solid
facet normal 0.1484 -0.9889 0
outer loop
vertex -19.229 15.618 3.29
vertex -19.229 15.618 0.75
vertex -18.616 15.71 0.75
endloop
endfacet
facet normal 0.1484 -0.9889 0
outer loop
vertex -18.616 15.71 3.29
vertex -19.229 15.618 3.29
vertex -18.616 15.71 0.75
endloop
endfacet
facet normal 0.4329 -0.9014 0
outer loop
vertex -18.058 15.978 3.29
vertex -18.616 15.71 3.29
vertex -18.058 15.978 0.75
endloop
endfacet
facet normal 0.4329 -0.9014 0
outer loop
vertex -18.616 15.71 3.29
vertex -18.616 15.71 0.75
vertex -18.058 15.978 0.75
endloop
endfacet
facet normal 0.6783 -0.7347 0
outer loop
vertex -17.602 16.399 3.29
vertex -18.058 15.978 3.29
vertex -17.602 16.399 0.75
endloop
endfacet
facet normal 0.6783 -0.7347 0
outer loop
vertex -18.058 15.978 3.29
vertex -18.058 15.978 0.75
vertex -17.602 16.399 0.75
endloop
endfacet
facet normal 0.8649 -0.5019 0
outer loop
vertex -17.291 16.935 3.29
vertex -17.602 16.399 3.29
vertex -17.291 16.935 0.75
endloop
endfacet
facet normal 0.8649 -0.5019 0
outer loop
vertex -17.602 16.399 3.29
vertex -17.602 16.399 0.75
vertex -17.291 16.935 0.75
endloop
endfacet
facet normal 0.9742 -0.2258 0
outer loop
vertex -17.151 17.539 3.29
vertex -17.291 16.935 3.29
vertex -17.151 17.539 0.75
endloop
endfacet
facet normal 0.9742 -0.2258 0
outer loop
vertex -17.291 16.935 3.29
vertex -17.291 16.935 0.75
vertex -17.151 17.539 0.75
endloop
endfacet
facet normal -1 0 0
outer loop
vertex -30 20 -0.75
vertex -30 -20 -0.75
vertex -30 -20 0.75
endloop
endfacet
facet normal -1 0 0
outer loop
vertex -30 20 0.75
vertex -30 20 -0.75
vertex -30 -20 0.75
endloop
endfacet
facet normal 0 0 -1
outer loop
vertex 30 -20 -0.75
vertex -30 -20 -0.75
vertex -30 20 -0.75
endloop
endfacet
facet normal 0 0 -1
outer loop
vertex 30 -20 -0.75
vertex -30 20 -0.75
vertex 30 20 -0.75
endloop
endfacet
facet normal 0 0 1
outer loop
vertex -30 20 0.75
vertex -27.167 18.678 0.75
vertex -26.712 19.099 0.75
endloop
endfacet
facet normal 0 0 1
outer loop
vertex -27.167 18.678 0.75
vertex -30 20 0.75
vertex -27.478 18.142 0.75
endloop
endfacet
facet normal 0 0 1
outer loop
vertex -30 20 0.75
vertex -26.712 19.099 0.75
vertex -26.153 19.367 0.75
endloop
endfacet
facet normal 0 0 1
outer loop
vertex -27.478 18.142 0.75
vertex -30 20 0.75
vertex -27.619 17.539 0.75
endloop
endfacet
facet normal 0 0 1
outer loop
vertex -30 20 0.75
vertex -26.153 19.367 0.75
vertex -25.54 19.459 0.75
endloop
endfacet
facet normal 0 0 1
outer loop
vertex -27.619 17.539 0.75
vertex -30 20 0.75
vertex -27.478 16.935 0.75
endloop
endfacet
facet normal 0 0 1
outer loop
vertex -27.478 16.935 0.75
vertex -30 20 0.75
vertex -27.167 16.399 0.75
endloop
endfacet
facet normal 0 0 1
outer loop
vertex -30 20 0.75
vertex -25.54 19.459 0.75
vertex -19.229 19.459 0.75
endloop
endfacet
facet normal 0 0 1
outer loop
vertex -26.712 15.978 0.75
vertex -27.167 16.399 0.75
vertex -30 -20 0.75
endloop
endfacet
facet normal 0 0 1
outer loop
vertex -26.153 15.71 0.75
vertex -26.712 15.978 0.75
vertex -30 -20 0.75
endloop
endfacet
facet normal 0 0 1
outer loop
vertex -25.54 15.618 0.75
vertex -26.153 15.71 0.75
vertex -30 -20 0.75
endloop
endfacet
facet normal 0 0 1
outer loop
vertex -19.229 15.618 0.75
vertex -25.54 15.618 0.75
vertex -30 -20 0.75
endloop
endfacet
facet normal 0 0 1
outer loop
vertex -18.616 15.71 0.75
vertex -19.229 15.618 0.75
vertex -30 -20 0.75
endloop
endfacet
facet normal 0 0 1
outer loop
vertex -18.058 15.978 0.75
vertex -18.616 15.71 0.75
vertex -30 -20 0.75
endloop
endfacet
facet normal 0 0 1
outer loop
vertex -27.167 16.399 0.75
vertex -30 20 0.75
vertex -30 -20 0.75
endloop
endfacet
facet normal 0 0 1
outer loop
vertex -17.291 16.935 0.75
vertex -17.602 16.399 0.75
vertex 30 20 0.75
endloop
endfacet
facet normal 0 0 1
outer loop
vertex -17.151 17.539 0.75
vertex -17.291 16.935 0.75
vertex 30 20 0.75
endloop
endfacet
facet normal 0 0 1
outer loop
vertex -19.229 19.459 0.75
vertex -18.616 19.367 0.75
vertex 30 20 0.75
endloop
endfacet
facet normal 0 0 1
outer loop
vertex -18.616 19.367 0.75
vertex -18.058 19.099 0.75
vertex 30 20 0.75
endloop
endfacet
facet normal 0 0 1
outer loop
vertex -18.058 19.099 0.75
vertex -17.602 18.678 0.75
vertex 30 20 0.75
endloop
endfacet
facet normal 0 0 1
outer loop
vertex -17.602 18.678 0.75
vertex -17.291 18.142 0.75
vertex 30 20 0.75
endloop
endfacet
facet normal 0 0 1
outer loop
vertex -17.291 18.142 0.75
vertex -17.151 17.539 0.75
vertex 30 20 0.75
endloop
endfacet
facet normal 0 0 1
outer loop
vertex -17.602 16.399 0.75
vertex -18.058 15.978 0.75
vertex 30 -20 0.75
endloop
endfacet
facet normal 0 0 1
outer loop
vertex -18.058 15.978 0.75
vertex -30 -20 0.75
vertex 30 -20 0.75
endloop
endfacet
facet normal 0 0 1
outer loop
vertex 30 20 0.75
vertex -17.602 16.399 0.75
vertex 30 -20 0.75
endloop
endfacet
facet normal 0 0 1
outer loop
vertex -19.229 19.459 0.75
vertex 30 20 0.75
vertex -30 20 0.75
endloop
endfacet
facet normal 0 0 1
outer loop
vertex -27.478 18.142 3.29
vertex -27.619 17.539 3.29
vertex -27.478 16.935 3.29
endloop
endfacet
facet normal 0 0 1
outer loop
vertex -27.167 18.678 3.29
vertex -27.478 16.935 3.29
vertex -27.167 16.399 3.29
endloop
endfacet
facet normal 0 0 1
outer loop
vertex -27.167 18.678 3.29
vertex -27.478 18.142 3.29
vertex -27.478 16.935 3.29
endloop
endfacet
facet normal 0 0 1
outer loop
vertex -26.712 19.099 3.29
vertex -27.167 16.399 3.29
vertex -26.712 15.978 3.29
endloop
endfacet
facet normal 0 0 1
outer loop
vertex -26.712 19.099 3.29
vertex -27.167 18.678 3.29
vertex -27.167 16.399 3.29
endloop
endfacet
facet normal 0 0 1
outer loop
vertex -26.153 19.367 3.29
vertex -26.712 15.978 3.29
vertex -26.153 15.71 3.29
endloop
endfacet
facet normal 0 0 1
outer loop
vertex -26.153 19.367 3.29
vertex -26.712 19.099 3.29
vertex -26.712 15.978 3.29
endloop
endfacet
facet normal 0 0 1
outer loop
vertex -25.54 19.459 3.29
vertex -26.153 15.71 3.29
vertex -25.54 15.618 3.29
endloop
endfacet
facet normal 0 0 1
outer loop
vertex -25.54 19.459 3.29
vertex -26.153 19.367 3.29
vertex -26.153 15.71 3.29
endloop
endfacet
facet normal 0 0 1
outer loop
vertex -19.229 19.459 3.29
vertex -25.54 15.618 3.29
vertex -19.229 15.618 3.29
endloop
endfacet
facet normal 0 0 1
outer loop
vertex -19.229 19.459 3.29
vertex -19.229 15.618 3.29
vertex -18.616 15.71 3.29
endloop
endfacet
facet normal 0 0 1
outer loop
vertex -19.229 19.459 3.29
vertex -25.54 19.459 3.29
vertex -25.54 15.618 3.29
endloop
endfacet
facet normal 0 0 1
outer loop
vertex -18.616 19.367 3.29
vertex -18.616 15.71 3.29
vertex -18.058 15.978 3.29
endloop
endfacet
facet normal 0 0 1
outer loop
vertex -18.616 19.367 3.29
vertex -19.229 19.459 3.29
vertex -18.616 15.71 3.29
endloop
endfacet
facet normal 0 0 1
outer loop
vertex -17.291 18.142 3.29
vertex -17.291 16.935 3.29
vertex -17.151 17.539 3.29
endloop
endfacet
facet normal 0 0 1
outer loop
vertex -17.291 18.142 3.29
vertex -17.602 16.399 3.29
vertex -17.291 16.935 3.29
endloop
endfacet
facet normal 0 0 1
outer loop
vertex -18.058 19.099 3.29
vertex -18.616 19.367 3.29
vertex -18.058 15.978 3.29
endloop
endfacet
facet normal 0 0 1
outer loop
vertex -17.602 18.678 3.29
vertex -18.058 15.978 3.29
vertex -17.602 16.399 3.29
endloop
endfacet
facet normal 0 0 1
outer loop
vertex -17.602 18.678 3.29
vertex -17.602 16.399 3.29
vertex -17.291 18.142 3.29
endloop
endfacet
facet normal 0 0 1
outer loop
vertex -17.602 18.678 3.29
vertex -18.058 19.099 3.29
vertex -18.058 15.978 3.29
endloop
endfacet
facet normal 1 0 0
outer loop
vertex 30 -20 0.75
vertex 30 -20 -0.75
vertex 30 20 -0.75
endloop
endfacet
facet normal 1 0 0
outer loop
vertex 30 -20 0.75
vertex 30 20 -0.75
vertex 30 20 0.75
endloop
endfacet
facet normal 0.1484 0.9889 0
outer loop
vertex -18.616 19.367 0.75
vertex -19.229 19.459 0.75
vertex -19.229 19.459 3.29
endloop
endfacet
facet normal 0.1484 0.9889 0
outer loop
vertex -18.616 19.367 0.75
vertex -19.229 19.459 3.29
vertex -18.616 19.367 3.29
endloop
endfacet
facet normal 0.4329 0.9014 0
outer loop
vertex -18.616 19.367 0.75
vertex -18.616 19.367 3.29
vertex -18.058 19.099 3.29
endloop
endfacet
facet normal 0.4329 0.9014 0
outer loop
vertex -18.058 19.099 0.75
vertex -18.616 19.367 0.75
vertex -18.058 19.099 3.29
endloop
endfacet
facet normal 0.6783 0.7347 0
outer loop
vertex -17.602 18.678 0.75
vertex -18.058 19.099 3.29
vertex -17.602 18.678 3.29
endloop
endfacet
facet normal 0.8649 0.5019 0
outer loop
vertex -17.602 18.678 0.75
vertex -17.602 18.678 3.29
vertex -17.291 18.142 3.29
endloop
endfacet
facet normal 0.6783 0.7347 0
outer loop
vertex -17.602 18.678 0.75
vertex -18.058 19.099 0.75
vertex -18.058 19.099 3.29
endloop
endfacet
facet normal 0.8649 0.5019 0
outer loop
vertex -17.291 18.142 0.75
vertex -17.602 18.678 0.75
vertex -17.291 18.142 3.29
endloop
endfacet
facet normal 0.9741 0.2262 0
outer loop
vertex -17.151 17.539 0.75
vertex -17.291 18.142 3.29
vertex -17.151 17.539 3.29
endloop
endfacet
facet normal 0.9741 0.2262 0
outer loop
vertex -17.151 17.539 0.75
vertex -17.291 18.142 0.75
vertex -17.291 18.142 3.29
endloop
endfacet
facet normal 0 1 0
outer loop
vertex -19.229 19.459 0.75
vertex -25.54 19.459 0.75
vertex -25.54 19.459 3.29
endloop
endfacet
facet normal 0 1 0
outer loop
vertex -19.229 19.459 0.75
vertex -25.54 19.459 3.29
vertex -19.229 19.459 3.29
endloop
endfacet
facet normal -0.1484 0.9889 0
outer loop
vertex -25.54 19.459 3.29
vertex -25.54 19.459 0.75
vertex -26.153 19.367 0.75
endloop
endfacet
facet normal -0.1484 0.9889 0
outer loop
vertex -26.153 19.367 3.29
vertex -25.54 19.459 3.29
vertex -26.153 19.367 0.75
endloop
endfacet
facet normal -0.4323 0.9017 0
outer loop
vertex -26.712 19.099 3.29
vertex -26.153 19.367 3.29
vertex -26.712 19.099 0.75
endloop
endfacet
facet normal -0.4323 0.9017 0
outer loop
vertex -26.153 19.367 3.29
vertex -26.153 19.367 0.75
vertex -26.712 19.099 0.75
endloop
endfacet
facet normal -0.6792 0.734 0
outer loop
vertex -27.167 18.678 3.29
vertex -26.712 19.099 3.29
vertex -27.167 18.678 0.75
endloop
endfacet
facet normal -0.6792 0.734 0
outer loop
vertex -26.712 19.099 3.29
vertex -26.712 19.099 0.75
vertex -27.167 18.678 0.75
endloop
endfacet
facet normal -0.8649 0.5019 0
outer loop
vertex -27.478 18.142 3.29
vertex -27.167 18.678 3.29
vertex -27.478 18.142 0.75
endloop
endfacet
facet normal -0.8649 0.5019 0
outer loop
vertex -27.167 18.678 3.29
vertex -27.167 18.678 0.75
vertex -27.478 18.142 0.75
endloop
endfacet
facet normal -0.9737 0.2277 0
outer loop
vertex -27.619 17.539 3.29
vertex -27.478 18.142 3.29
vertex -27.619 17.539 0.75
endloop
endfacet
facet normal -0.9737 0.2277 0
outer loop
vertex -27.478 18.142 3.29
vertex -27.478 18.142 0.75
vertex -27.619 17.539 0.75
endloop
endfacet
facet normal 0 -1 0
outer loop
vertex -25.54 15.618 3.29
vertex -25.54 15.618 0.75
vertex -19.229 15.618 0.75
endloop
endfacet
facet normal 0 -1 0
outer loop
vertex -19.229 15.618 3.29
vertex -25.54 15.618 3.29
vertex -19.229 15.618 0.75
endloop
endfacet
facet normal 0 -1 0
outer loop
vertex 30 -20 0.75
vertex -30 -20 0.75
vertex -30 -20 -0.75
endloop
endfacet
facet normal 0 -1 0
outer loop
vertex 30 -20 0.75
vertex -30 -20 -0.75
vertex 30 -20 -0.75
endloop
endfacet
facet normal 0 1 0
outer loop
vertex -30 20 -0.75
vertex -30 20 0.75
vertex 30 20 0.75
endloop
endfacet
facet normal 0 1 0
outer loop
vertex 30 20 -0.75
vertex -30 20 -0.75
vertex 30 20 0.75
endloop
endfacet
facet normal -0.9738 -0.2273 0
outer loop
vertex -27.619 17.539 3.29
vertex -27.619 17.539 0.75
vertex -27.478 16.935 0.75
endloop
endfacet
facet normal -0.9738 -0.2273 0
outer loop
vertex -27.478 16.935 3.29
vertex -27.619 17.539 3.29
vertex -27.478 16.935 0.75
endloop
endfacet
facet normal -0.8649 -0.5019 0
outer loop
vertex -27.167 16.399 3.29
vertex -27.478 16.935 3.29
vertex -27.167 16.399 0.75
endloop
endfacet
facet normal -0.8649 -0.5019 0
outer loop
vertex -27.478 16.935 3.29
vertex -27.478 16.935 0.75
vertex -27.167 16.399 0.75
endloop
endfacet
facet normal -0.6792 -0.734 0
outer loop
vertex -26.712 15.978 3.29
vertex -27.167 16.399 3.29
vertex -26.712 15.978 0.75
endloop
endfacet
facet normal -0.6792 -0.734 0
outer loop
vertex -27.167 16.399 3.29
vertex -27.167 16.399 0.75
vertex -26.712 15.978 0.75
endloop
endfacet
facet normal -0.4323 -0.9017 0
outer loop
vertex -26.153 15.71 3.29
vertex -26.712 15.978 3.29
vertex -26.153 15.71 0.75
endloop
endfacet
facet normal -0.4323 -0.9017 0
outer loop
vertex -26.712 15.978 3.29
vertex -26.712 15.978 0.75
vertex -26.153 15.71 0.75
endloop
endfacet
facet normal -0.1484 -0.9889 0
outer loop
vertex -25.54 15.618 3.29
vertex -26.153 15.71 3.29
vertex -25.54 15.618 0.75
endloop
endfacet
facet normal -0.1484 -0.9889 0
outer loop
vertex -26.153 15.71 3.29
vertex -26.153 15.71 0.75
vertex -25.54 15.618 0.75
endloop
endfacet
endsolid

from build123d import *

# Parameters (mm, degrees)
F0_W        = 60
F0_H        = 1.5
F1_DEPTH    = 20
F2_W        = 10.4806274176
F2_H        = 3.8417847827
F3_DEPTH    = 2.54
F4_T1_DEPTH = 7.7522870812


# Not quite as in the source:
# - a fillet or chamfer that OpenCascade refuses, or shapes differently, is made with other operations: its cross-section is extruded or revolved along the edge and cut away or added


with BuildPart() as f1:
    # F0 (on Front) → F1 (new body, symmetric)
    with BuildSketch(Plane.XZ):
        Rectangle(F0_W, F0_H)
    extrude(amount=F1_DEPTH, both=True)

    # F2 (on face) → F3 (join)
    with BuildSketch(Plane.XY.offset(0.75)):
        with Locations((-22.3847124726, 17.5385358743)):
            Rectangle(F2_W, F2_H)
    extrude(amount=F3_DEPTH)

    # F4: fillet of radius 2.0849148325 on 4 edges, made by hand

    # F4_s2 → F4_t1 (cut)
    with BuildSketch(Plane.XY.offset(0.75)):
        with BuildLine():
            ThreePointArc((-27.6250261813, 17.7025583154), (-27.0143687651, 16.2283008992), (-25.5401113489, 15.617643483))
            Line((-25.5401113489, 15.617643483), (-27.6250261813, 15.617643483))
            Line((-27.6250261813, 15.617643483), (-27.6250261813, 17.7025583154))
        make_face()
        with BuildLine():
            ThreePointArc((-25.5401113489, 19.4594282657), (-27.0143687651, 18.8487708495), (-27.6250261813, 17.3745134332))
            Line((-27.6250261813, 17.3745134332), (-27.6250261813, 19.4594282657))
            Line((-27.6250261813, 19.4594282657), (-25.5401113489, 19.4594282657))
        make_face()
        with BuildLine():
            ThreePointArc((-19.2293135962, 15.617643483), (-17.75505618, 16.2283008992), (-17.1443987638, 17.7025583154))
            Line((-17.1443987638, 17.7025583154), (-17.1443987638, 15.617643483))
            Line((-17.1443987638, 15.617643483), (-19.2293135962, 15.617643483))
        make_face()
        with BuildLine():
            ThreePointArc((-19.2293135962, 19.4594282657), (-17.75505618, 18.8487708495), (-17.1443987638, 17.3745134332))
            Line((-17.1443987638, 17.3745134332), (-17.1443987638, 19.4594282657))
            Line((-17.1443987638, 19.4594282657), (-19.2293135962, 19.4594282657))
        make_face()
    extrude(amount=F4_T1_DEPTH, mode=Mode.SUBTRACT)


solid = f1.part
